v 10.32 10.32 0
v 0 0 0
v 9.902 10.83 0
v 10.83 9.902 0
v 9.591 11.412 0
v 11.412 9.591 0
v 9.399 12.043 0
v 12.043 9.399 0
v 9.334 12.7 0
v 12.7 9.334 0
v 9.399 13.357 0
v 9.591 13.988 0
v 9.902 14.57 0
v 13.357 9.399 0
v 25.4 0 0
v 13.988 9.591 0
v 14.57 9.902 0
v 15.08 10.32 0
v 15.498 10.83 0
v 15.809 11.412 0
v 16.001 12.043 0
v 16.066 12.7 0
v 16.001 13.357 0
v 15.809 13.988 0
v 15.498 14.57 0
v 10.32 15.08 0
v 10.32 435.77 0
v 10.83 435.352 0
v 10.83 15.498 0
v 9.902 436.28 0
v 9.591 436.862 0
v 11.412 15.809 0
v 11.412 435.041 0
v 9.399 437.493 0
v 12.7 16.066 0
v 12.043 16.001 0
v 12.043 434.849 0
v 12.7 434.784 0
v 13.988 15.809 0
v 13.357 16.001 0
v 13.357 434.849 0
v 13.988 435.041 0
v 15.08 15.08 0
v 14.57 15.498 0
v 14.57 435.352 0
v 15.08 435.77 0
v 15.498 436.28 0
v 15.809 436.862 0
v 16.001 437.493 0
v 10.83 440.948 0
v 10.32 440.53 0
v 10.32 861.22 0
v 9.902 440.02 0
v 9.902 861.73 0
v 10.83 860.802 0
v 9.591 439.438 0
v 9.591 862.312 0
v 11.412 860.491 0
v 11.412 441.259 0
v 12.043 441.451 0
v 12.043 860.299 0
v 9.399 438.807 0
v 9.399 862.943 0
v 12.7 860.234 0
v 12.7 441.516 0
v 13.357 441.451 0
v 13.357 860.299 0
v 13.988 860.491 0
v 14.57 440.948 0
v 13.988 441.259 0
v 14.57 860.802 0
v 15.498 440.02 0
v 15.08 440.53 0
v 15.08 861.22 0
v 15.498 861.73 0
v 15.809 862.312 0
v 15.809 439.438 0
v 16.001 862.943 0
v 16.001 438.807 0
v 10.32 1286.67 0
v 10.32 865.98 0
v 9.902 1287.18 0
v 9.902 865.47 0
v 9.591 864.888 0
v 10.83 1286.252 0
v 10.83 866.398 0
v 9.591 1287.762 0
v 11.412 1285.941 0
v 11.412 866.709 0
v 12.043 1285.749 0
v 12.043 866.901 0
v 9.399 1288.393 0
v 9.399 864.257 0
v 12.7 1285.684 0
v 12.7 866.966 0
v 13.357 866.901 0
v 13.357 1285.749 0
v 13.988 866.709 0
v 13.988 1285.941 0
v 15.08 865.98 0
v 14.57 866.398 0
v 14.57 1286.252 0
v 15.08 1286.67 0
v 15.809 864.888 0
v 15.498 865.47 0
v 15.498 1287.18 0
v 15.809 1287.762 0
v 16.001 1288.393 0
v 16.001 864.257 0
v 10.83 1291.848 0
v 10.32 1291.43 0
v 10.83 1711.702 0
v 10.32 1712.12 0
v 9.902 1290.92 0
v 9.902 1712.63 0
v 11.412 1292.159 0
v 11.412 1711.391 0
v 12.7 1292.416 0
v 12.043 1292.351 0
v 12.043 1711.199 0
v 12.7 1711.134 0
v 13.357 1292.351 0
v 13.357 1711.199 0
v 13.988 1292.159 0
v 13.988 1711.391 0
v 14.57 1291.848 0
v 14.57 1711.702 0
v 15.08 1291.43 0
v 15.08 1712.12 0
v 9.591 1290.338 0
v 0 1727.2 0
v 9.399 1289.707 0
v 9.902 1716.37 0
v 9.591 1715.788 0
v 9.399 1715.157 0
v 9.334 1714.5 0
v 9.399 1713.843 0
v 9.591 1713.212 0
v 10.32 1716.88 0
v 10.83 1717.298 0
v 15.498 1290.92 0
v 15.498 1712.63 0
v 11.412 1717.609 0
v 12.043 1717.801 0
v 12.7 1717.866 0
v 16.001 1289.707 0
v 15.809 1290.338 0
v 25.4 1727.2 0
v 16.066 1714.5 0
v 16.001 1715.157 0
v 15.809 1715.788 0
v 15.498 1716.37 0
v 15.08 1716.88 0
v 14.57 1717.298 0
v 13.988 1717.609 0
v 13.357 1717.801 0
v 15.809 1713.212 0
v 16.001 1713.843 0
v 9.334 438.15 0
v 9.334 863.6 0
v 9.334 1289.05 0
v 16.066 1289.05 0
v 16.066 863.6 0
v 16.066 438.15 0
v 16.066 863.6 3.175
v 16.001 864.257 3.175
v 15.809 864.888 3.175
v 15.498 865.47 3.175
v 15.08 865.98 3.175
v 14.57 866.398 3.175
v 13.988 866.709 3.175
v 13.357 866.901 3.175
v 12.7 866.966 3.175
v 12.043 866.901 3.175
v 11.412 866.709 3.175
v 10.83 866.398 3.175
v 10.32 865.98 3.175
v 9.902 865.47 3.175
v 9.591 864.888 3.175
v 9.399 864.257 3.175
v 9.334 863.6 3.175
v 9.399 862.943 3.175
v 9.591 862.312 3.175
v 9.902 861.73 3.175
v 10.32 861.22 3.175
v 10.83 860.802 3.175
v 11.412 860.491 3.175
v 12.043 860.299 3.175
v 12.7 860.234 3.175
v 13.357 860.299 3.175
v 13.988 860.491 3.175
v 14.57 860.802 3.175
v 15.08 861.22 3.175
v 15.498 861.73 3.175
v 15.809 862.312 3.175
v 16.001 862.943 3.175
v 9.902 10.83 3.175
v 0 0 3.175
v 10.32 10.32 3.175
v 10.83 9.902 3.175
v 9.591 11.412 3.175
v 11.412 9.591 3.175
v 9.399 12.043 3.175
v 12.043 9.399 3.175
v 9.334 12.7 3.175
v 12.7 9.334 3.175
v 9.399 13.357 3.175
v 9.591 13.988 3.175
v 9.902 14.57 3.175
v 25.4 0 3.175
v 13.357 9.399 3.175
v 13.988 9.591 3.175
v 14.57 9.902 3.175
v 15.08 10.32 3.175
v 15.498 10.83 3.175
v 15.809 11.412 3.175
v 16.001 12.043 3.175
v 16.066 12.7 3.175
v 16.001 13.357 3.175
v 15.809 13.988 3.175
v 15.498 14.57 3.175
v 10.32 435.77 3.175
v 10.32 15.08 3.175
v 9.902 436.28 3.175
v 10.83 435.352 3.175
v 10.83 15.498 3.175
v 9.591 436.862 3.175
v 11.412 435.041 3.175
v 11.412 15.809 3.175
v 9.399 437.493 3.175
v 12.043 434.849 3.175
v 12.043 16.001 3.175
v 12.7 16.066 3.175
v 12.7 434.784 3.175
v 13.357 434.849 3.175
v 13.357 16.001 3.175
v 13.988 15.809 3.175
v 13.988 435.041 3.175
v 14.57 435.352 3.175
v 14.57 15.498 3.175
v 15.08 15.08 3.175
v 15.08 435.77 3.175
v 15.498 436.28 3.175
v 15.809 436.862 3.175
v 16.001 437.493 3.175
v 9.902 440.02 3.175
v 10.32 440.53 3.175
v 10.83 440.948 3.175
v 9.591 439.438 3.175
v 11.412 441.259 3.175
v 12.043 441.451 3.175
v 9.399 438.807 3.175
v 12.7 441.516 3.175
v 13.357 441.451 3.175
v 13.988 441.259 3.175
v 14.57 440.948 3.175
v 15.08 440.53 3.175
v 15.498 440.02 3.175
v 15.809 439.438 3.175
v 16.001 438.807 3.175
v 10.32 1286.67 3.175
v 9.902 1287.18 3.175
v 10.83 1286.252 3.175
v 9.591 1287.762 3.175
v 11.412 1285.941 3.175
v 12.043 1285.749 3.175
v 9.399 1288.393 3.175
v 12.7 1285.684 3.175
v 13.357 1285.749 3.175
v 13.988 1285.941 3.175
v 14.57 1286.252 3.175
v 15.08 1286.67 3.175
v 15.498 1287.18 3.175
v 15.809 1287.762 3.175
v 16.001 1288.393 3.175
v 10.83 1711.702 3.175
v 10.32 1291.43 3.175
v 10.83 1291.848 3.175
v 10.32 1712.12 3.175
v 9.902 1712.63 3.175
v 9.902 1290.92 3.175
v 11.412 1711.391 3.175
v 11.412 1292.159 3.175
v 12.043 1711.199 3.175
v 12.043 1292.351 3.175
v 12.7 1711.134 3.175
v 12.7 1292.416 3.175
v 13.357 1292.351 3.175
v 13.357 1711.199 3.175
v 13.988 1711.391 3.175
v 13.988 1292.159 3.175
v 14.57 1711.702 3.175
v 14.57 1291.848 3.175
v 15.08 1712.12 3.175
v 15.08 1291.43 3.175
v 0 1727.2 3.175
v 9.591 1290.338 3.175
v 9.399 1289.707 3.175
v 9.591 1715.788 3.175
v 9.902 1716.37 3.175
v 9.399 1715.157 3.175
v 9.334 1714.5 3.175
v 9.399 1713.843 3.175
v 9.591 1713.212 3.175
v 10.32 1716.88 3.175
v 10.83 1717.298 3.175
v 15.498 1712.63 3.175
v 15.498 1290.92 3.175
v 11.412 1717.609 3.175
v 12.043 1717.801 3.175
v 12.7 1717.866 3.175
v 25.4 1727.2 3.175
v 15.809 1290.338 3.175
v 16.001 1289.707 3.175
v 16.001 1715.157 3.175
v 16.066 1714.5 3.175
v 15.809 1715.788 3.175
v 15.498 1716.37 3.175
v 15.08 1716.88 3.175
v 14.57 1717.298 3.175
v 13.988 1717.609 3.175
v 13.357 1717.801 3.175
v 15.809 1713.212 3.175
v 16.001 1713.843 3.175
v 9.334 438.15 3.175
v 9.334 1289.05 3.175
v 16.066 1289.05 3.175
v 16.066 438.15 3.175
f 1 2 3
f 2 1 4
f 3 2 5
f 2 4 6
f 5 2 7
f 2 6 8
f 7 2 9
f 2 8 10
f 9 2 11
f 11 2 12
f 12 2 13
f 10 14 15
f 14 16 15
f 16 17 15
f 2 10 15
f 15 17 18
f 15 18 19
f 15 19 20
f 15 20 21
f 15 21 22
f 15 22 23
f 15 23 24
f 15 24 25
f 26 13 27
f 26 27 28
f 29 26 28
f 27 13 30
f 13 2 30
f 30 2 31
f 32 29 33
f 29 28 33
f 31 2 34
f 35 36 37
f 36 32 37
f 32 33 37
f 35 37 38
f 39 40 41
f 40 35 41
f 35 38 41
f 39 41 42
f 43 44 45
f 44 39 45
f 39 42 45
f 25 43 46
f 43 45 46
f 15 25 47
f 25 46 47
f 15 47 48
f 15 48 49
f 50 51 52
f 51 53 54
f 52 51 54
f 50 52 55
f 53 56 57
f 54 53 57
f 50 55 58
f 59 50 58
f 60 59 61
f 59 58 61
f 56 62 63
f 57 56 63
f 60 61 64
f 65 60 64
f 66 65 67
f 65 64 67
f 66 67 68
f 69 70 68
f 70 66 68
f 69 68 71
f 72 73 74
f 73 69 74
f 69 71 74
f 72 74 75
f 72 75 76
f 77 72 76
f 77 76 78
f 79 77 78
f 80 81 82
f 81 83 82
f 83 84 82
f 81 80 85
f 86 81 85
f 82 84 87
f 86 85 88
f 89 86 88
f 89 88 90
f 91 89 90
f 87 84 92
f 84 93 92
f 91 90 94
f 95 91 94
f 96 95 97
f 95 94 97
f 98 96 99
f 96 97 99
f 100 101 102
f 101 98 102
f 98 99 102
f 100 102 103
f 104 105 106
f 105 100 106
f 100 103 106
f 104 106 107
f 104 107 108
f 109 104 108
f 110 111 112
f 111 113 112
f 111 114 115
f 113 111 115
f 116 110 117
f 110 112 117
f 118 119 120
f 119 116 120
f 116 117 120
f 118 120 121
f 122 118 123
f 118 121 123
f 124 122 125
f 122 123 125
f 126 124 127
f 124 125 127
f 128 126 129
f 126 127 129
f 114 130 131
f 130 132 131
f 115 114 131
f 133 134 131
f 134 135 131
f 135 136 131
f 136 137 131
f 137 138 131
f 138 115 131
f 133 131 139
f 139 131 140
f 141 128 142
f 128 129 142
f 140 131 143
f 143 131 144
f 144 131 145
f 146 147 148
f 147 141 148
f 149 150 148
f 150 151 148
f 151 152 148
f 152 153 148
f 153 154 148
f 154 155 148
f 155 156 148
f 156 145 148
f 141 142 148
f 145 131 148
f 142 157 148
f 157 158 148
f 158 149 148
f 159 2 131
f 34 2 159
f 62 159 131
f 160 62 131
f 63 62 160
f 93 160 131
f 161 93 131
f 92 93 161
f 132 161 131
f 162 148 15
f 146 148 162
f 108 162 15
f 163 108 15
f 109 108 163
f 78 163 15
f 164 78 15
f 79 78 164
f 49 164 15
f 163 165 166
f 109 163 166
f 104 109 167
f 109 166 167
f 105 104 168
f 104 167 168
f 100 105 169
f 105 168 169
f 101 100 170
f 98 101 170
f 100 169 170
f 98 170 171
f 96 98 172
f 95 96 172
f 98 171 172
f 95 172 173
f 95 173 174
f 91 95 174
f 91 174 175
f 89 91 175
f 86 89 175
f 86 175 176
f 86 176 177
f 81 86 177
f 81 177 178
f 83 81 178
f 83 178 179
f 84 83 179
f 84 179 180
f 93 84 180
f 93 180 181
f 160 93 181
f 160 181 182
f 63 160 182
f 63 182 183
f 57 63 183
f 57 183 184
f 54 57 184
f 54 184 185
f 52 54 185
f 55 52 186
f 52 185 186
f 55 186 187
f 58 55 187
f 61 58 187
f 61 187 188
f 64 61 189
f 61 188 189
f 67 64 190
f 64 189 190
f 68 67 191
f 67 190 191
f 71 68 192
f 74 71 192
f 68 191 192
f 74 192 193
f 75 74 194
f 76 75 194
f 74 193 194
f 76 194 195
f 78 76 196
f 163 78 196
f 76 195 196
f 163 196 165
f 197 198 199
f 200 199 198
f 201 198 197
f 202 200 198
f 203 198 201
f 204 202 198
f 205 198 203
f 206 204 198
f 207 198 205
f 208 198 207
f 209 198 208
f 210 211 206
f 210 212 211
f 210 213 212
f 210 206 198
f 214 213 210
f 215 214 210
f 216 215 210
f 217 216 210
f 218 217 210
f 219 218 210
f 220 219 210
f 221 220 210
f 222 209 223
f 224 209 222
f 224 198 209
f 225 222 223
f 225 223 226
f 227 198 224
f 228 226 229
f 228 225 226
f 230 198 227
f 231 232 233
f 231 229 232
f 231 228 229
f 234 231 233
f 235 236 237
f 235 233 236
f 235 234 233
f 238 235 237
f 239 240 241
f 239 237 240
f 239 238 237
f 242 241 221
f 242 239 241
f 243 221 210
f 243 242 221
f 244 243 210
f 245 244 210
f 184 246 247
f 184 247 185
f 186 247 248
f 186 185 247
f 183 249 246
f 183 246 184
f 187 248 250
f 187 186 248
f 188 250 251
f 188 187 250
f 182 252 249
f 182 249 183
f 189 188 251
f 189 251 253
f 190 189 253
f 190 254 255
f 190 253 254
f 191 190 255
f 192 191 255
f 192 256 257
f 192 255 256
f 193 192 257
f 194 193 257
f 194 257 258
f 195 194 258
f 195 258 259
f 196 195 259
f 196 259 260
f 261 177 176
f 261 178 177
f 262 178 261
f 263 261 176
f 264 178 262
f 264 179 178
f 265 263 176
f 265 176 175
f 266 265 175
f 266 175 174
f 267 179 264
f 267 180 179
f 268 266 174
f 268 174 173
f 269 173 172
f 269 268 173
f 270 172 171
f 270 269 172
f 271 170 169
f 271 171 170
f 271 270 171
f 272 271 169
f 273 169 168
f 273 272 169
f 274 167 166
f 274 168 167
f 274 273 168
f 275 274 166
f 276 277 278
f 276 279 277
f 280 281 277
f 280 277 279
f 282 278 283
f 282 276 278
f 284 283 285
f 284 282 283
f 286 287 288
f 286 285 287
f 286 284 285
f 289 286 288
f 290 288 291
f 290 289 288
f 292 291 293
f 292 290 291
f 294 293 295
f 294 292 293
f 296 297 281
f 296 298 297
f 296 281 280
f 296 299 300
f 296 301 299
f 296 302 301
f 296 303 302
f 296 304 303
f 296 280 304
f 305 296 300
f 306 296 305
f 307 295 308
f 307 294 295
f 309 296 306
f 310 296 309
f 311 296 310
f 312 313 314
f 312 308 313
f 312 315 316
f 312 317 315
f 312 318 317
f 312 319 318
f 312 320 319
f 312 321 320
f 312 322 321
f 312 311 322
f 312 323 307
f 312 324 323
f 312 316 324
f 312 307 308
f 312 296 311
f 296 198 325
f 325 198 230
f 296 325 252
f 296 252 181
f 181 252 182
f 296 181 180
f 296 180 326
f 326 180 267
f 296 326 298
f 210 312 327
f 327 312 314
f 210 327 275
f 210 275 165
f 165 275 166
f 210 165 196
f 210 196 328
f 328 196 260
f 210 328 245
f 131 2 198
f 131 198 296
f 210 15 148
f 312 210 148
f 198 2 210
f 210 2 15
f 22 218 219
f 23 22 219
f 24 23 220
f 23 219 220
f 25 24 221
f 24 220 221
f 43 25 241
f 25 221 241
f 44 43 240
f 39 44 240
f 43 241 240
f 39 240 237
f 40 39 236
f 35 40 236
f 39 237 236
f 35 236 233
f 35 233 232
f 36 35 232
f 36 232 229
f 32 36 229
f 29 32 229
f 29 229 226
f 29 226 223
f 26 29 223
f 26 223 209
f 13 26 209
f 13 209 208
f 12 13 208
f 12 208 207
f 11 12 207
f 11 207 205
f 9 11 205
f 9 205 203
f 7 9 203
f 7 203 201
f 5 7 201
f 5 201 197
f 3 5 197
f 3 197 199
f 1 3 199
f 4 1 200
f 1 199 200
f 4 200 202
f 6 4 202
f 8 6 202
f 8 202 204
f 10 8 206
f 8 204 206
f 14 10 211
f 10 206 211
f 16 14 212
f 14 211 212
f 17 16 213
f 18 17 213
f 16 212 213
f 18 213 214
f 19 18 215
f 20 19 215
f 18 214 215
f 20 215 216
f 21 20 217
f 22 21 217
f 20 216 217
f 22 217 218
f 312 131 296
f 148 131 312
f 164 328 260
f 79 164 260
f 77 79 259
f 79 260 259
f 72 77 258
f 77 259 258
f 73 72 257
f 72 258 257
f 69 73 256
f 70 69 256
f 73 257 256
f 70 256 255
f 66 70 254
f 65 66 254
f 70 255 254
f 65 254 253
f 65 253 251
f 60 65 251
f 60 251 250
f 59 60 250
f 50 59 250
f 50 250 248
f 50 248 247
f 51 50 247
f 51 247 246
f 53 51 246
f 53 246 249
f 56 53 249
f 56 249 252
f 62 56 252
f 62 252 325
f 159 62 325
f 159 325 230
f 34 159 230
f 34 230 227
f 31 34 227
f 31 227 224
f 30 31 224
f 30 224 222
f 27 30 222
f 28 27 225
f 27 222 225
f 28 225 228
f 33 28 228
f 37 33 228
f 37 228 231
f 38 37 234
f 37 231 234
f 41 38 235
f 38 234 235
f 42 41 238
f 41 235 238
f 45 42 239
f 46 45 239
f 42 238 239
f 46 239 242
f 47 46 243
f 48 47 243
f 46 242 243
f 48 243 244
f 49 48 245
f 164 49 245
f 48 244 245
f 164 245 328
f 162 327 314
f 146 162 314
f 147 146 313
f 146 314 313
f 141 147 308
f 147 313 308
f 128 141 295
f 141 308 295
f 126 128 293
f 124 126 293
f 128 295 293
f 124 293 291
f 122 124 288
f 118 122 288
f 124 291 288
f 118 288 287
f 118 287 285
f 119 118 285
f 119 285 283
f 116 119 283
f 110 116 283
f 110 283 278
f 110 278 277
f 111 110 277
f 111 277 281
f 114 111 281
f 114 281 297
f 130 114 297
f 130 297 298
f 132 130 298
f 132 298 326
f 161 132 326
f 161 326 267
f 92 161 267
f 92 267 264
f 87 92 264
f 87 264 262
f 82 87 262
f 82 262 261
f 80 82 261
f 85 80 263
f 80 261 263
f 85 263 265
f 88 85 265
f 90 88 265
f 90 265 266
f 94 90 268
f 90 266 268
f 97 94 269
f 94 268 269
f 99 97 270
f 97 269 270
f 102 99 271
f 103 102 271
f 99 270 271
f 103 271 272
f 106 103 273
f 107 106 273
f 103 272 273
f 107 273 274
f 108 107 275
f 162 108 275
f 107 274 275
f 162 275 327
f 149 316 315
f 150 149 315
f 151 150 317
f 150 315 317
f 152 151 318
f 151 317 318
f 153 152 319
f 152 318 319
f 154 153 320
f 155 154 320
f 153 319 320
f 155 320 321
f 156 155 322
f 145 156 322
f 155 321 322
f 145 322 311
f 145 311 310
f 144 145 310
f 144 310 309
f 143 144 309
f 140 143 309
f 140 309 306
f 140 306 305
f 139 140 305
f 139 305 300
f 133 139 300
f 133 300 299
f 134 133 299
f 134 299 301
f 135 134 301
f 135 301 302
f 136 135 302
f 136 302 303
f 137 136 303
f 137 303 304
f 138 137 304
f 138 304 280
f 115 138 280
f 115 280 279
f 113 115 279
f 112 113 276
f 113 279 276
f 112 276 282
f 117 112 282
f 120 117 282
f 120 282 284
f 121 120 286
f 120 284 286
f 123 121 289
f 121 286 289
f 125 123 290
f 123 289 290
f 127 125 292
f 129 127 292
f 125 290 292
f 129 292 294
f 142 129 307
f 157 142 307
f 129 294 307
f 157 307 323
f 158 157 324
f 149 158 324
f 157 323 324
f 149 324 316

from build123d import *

# Parameters (mm, degrees)
SKETCH1_W           = 25.4
SKETCH1_H           = 1727.2
BOSS_EXTRUDE1_DEPTH = 3.175
SKETCH2_R           = 3.3655
CUT_EXTRUDE1_DEPTH  = 4.175
LPATTERN1_COUNT     = 5
LPATTERN1_PITCH     = 425.45


with BuildPart() as part:
    # Sketch1 → Boss-Extrude1 (new body)
    with BuildSketch(Plane.XY):
        with Locations((12.7, 863.6)):
            Rectangle(SKETCH1_W, SKETCH1_H)
    extrude(amount=BOSS_EXTRUDE1_DEPTH)

    # Sketch2 → Cut-Extrude1 (cut, through all)
    with BuildSketch(Plane.XY.offset(3.175)):
        with Locations((12.7, 12.7)):
            Circle(SKETCH2_R)
    cut_extrude1 = extrude(amount=-CUT_EXTRUDE1_DEPTH, mode=Mode.SUBTRACT)

    # LPattern1: Cut-Extrude1 ×5
    with Locations(*[(0, i * LPATTERN1_PITCH, 0) for i in range(1, LPATTERN1_COUNT)]):
        add(cut_extrude1, mode=Mode.SUBTRACT)


solid = part.part
